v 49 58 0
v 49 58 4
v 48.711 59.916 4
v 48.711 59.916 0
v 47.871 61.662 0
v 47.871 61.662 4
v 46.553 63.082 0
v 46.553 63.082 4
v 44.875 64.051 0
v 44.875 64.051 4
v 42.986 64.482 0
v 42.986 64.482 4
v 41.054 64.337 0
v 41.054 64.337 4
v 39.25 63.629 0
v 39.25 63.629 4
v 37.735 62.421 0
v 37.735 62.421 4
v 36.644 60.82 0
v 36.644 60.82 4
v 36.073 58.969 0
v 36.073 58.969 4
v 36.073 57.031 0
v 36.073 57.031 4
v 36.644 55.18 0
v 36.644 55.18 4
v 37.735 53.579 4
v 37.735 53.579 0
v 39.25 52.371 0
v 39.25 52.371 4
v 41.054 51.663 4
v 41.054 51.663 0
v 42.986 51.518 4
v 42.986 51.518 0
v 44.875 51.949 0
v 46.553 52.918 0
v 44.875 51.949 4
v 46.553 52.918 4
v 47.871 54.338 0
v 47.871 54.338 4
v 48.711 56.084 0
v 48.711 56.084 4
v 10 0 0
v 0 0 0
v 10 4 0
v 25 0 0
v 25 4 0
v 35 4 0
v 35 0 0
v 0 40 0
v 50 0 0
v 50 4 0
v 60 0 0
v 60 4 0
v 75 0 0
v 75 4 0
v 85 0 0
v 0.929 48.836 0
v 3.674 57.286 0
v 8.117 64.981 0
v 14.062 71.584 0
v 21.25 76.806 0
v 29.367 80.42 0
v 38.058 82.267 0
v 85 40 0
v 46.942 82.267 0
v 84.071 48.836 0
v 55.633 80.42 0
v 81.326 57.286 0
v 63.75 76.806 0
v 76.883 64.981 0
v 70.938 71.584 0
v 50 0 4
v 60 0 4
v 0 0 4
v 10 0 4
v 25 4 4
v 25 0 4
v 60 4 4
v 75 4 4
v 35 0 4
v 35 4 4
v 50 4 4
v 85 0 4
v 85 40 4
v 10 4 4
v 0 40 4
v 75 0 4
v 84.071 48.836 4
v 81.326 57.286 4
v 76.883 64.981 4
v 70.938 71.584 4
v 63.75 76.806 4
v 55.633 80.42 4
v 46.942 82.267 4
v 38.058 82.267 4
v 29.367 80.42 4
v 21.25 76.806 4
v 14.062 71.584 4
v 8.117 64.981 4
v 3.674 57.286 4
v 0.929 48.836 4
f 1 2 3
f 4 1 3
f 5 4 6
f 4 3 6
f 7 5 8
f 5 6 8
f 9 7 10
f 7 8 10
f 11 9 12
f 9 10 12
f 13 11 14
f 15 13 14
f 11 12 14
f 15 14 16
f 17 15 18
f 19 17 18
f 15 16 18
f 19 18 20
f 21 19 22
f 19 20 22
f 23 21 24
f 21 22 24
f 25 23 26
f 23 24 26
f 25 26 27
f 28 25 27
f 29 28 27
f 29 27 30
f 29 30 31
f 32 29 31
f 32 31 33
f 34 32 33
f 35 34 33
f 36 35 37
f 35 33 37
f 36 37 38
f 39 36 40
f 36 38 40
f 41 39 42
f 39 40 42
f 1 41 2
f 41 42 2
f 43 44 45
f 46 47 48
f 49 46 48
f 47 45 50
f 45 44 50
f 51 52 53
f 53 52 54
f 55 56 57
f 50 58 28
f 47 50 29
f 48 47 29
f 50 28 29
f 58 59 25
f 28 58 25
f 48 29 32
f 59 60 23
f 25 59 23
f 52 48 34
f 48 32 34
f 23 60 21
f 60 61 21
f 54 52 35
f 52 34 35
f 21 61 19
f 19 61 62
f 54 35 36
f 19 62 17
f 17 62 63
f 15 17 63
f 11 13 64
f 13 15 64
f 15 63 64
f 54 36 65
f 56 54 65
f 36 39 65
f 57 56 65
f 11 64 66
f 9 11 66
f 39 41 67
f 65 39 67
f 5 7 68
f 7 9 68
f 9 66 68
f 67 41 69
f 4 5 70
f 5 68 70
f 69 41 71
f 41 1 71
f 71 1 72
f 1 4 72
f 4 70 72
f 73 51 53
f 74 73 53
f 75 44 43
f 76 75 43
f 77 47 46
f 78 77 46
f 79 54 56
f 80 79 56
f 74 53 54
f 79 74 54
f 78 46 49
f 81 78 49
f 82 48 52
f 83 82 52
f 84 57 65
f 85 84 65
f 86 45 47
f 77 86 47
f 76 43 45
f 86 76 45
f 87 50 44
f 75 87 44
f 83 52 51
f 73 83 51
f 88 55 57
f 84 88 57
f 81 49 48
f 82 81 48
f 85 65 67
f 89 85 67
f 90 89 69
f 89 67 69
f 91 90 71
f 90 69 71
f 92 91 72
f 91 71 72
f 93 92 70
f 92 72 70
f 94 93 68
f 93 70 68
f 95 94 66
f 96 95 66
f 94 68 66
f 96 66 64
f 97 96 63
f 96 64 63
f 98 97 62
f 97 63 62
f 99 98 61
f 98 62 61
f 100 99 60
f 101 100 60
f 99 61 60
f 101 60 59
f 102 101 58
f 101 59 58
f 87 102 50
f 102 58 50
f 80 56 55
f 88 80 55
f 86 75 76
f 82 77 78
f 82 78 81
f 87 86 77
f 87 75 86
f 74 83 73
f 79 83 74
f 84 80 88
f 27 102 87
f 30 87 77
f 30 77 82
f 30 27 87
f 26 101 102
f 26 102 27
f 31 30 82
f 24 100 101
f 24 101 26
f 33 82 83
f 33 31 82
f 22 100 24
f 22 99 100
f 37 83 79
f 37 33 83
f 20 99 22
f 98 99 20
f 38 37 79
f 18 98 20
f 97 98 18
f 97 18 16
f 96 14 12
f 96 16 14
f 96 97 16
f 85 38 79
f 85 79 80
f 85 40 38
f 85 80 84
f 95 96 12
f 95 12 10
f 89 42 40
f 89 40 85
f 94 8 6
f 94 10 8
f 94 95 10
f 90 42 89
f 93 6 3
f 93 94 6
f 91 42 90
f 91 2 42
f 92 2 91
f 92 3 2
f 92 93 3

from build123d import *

# Parameters (mm, degrees)
SALIENTE_EXTRUIR1_DEPTH = 4
CROQUIS2_R              = 6.5
CORTAR_EXTRUIR1_DEPTH   = 4


with BuildPart() as part:
    # Croquis1 → Saliente-Extruir1 (new body)
    with BuildSketch(Plane.XY):
        with BuildLine():
            Line((0, 0), (10, 0))
            Line((10, 0), (10, 4))
            Line((10, 4), (25, 4))
            Line((25, 4), (25, 0))
            Line((25, 0), (35, 0))
            Line((35, 0), (35, 4))
            Line((35, 4), (50, 4))
            Line((50, 4), (50, 0))
            Line((50, 0), (60, 0))
            Line((60, 0), (60, 4))
            Line((60, 4), (75, 4))
            Line((75, 4), (75, 0))
            Line((75, 0), (85, 0))
            Line((85, 0), (85, 40))
            ThreePointArc((85, 40), (42.5, 82.5), (0, 40))
            Line((0, 40), (0, 0))
        make_face()
    extrude(amount=SALIENTE_EXTRUIR1_DEPTH)

    # Croquis2 → Cortar-Extruir1 (cut)
    with BuildSketch(Plane.XY.offset(4)):
        with Locations((42.5, 58)):
            Circle(CROQUIS2_R)
    extrude(amount=-CORTAR_EXTRUIR1_DEPTH, mode=Mode.SUBTRACT)


solid = part.part
